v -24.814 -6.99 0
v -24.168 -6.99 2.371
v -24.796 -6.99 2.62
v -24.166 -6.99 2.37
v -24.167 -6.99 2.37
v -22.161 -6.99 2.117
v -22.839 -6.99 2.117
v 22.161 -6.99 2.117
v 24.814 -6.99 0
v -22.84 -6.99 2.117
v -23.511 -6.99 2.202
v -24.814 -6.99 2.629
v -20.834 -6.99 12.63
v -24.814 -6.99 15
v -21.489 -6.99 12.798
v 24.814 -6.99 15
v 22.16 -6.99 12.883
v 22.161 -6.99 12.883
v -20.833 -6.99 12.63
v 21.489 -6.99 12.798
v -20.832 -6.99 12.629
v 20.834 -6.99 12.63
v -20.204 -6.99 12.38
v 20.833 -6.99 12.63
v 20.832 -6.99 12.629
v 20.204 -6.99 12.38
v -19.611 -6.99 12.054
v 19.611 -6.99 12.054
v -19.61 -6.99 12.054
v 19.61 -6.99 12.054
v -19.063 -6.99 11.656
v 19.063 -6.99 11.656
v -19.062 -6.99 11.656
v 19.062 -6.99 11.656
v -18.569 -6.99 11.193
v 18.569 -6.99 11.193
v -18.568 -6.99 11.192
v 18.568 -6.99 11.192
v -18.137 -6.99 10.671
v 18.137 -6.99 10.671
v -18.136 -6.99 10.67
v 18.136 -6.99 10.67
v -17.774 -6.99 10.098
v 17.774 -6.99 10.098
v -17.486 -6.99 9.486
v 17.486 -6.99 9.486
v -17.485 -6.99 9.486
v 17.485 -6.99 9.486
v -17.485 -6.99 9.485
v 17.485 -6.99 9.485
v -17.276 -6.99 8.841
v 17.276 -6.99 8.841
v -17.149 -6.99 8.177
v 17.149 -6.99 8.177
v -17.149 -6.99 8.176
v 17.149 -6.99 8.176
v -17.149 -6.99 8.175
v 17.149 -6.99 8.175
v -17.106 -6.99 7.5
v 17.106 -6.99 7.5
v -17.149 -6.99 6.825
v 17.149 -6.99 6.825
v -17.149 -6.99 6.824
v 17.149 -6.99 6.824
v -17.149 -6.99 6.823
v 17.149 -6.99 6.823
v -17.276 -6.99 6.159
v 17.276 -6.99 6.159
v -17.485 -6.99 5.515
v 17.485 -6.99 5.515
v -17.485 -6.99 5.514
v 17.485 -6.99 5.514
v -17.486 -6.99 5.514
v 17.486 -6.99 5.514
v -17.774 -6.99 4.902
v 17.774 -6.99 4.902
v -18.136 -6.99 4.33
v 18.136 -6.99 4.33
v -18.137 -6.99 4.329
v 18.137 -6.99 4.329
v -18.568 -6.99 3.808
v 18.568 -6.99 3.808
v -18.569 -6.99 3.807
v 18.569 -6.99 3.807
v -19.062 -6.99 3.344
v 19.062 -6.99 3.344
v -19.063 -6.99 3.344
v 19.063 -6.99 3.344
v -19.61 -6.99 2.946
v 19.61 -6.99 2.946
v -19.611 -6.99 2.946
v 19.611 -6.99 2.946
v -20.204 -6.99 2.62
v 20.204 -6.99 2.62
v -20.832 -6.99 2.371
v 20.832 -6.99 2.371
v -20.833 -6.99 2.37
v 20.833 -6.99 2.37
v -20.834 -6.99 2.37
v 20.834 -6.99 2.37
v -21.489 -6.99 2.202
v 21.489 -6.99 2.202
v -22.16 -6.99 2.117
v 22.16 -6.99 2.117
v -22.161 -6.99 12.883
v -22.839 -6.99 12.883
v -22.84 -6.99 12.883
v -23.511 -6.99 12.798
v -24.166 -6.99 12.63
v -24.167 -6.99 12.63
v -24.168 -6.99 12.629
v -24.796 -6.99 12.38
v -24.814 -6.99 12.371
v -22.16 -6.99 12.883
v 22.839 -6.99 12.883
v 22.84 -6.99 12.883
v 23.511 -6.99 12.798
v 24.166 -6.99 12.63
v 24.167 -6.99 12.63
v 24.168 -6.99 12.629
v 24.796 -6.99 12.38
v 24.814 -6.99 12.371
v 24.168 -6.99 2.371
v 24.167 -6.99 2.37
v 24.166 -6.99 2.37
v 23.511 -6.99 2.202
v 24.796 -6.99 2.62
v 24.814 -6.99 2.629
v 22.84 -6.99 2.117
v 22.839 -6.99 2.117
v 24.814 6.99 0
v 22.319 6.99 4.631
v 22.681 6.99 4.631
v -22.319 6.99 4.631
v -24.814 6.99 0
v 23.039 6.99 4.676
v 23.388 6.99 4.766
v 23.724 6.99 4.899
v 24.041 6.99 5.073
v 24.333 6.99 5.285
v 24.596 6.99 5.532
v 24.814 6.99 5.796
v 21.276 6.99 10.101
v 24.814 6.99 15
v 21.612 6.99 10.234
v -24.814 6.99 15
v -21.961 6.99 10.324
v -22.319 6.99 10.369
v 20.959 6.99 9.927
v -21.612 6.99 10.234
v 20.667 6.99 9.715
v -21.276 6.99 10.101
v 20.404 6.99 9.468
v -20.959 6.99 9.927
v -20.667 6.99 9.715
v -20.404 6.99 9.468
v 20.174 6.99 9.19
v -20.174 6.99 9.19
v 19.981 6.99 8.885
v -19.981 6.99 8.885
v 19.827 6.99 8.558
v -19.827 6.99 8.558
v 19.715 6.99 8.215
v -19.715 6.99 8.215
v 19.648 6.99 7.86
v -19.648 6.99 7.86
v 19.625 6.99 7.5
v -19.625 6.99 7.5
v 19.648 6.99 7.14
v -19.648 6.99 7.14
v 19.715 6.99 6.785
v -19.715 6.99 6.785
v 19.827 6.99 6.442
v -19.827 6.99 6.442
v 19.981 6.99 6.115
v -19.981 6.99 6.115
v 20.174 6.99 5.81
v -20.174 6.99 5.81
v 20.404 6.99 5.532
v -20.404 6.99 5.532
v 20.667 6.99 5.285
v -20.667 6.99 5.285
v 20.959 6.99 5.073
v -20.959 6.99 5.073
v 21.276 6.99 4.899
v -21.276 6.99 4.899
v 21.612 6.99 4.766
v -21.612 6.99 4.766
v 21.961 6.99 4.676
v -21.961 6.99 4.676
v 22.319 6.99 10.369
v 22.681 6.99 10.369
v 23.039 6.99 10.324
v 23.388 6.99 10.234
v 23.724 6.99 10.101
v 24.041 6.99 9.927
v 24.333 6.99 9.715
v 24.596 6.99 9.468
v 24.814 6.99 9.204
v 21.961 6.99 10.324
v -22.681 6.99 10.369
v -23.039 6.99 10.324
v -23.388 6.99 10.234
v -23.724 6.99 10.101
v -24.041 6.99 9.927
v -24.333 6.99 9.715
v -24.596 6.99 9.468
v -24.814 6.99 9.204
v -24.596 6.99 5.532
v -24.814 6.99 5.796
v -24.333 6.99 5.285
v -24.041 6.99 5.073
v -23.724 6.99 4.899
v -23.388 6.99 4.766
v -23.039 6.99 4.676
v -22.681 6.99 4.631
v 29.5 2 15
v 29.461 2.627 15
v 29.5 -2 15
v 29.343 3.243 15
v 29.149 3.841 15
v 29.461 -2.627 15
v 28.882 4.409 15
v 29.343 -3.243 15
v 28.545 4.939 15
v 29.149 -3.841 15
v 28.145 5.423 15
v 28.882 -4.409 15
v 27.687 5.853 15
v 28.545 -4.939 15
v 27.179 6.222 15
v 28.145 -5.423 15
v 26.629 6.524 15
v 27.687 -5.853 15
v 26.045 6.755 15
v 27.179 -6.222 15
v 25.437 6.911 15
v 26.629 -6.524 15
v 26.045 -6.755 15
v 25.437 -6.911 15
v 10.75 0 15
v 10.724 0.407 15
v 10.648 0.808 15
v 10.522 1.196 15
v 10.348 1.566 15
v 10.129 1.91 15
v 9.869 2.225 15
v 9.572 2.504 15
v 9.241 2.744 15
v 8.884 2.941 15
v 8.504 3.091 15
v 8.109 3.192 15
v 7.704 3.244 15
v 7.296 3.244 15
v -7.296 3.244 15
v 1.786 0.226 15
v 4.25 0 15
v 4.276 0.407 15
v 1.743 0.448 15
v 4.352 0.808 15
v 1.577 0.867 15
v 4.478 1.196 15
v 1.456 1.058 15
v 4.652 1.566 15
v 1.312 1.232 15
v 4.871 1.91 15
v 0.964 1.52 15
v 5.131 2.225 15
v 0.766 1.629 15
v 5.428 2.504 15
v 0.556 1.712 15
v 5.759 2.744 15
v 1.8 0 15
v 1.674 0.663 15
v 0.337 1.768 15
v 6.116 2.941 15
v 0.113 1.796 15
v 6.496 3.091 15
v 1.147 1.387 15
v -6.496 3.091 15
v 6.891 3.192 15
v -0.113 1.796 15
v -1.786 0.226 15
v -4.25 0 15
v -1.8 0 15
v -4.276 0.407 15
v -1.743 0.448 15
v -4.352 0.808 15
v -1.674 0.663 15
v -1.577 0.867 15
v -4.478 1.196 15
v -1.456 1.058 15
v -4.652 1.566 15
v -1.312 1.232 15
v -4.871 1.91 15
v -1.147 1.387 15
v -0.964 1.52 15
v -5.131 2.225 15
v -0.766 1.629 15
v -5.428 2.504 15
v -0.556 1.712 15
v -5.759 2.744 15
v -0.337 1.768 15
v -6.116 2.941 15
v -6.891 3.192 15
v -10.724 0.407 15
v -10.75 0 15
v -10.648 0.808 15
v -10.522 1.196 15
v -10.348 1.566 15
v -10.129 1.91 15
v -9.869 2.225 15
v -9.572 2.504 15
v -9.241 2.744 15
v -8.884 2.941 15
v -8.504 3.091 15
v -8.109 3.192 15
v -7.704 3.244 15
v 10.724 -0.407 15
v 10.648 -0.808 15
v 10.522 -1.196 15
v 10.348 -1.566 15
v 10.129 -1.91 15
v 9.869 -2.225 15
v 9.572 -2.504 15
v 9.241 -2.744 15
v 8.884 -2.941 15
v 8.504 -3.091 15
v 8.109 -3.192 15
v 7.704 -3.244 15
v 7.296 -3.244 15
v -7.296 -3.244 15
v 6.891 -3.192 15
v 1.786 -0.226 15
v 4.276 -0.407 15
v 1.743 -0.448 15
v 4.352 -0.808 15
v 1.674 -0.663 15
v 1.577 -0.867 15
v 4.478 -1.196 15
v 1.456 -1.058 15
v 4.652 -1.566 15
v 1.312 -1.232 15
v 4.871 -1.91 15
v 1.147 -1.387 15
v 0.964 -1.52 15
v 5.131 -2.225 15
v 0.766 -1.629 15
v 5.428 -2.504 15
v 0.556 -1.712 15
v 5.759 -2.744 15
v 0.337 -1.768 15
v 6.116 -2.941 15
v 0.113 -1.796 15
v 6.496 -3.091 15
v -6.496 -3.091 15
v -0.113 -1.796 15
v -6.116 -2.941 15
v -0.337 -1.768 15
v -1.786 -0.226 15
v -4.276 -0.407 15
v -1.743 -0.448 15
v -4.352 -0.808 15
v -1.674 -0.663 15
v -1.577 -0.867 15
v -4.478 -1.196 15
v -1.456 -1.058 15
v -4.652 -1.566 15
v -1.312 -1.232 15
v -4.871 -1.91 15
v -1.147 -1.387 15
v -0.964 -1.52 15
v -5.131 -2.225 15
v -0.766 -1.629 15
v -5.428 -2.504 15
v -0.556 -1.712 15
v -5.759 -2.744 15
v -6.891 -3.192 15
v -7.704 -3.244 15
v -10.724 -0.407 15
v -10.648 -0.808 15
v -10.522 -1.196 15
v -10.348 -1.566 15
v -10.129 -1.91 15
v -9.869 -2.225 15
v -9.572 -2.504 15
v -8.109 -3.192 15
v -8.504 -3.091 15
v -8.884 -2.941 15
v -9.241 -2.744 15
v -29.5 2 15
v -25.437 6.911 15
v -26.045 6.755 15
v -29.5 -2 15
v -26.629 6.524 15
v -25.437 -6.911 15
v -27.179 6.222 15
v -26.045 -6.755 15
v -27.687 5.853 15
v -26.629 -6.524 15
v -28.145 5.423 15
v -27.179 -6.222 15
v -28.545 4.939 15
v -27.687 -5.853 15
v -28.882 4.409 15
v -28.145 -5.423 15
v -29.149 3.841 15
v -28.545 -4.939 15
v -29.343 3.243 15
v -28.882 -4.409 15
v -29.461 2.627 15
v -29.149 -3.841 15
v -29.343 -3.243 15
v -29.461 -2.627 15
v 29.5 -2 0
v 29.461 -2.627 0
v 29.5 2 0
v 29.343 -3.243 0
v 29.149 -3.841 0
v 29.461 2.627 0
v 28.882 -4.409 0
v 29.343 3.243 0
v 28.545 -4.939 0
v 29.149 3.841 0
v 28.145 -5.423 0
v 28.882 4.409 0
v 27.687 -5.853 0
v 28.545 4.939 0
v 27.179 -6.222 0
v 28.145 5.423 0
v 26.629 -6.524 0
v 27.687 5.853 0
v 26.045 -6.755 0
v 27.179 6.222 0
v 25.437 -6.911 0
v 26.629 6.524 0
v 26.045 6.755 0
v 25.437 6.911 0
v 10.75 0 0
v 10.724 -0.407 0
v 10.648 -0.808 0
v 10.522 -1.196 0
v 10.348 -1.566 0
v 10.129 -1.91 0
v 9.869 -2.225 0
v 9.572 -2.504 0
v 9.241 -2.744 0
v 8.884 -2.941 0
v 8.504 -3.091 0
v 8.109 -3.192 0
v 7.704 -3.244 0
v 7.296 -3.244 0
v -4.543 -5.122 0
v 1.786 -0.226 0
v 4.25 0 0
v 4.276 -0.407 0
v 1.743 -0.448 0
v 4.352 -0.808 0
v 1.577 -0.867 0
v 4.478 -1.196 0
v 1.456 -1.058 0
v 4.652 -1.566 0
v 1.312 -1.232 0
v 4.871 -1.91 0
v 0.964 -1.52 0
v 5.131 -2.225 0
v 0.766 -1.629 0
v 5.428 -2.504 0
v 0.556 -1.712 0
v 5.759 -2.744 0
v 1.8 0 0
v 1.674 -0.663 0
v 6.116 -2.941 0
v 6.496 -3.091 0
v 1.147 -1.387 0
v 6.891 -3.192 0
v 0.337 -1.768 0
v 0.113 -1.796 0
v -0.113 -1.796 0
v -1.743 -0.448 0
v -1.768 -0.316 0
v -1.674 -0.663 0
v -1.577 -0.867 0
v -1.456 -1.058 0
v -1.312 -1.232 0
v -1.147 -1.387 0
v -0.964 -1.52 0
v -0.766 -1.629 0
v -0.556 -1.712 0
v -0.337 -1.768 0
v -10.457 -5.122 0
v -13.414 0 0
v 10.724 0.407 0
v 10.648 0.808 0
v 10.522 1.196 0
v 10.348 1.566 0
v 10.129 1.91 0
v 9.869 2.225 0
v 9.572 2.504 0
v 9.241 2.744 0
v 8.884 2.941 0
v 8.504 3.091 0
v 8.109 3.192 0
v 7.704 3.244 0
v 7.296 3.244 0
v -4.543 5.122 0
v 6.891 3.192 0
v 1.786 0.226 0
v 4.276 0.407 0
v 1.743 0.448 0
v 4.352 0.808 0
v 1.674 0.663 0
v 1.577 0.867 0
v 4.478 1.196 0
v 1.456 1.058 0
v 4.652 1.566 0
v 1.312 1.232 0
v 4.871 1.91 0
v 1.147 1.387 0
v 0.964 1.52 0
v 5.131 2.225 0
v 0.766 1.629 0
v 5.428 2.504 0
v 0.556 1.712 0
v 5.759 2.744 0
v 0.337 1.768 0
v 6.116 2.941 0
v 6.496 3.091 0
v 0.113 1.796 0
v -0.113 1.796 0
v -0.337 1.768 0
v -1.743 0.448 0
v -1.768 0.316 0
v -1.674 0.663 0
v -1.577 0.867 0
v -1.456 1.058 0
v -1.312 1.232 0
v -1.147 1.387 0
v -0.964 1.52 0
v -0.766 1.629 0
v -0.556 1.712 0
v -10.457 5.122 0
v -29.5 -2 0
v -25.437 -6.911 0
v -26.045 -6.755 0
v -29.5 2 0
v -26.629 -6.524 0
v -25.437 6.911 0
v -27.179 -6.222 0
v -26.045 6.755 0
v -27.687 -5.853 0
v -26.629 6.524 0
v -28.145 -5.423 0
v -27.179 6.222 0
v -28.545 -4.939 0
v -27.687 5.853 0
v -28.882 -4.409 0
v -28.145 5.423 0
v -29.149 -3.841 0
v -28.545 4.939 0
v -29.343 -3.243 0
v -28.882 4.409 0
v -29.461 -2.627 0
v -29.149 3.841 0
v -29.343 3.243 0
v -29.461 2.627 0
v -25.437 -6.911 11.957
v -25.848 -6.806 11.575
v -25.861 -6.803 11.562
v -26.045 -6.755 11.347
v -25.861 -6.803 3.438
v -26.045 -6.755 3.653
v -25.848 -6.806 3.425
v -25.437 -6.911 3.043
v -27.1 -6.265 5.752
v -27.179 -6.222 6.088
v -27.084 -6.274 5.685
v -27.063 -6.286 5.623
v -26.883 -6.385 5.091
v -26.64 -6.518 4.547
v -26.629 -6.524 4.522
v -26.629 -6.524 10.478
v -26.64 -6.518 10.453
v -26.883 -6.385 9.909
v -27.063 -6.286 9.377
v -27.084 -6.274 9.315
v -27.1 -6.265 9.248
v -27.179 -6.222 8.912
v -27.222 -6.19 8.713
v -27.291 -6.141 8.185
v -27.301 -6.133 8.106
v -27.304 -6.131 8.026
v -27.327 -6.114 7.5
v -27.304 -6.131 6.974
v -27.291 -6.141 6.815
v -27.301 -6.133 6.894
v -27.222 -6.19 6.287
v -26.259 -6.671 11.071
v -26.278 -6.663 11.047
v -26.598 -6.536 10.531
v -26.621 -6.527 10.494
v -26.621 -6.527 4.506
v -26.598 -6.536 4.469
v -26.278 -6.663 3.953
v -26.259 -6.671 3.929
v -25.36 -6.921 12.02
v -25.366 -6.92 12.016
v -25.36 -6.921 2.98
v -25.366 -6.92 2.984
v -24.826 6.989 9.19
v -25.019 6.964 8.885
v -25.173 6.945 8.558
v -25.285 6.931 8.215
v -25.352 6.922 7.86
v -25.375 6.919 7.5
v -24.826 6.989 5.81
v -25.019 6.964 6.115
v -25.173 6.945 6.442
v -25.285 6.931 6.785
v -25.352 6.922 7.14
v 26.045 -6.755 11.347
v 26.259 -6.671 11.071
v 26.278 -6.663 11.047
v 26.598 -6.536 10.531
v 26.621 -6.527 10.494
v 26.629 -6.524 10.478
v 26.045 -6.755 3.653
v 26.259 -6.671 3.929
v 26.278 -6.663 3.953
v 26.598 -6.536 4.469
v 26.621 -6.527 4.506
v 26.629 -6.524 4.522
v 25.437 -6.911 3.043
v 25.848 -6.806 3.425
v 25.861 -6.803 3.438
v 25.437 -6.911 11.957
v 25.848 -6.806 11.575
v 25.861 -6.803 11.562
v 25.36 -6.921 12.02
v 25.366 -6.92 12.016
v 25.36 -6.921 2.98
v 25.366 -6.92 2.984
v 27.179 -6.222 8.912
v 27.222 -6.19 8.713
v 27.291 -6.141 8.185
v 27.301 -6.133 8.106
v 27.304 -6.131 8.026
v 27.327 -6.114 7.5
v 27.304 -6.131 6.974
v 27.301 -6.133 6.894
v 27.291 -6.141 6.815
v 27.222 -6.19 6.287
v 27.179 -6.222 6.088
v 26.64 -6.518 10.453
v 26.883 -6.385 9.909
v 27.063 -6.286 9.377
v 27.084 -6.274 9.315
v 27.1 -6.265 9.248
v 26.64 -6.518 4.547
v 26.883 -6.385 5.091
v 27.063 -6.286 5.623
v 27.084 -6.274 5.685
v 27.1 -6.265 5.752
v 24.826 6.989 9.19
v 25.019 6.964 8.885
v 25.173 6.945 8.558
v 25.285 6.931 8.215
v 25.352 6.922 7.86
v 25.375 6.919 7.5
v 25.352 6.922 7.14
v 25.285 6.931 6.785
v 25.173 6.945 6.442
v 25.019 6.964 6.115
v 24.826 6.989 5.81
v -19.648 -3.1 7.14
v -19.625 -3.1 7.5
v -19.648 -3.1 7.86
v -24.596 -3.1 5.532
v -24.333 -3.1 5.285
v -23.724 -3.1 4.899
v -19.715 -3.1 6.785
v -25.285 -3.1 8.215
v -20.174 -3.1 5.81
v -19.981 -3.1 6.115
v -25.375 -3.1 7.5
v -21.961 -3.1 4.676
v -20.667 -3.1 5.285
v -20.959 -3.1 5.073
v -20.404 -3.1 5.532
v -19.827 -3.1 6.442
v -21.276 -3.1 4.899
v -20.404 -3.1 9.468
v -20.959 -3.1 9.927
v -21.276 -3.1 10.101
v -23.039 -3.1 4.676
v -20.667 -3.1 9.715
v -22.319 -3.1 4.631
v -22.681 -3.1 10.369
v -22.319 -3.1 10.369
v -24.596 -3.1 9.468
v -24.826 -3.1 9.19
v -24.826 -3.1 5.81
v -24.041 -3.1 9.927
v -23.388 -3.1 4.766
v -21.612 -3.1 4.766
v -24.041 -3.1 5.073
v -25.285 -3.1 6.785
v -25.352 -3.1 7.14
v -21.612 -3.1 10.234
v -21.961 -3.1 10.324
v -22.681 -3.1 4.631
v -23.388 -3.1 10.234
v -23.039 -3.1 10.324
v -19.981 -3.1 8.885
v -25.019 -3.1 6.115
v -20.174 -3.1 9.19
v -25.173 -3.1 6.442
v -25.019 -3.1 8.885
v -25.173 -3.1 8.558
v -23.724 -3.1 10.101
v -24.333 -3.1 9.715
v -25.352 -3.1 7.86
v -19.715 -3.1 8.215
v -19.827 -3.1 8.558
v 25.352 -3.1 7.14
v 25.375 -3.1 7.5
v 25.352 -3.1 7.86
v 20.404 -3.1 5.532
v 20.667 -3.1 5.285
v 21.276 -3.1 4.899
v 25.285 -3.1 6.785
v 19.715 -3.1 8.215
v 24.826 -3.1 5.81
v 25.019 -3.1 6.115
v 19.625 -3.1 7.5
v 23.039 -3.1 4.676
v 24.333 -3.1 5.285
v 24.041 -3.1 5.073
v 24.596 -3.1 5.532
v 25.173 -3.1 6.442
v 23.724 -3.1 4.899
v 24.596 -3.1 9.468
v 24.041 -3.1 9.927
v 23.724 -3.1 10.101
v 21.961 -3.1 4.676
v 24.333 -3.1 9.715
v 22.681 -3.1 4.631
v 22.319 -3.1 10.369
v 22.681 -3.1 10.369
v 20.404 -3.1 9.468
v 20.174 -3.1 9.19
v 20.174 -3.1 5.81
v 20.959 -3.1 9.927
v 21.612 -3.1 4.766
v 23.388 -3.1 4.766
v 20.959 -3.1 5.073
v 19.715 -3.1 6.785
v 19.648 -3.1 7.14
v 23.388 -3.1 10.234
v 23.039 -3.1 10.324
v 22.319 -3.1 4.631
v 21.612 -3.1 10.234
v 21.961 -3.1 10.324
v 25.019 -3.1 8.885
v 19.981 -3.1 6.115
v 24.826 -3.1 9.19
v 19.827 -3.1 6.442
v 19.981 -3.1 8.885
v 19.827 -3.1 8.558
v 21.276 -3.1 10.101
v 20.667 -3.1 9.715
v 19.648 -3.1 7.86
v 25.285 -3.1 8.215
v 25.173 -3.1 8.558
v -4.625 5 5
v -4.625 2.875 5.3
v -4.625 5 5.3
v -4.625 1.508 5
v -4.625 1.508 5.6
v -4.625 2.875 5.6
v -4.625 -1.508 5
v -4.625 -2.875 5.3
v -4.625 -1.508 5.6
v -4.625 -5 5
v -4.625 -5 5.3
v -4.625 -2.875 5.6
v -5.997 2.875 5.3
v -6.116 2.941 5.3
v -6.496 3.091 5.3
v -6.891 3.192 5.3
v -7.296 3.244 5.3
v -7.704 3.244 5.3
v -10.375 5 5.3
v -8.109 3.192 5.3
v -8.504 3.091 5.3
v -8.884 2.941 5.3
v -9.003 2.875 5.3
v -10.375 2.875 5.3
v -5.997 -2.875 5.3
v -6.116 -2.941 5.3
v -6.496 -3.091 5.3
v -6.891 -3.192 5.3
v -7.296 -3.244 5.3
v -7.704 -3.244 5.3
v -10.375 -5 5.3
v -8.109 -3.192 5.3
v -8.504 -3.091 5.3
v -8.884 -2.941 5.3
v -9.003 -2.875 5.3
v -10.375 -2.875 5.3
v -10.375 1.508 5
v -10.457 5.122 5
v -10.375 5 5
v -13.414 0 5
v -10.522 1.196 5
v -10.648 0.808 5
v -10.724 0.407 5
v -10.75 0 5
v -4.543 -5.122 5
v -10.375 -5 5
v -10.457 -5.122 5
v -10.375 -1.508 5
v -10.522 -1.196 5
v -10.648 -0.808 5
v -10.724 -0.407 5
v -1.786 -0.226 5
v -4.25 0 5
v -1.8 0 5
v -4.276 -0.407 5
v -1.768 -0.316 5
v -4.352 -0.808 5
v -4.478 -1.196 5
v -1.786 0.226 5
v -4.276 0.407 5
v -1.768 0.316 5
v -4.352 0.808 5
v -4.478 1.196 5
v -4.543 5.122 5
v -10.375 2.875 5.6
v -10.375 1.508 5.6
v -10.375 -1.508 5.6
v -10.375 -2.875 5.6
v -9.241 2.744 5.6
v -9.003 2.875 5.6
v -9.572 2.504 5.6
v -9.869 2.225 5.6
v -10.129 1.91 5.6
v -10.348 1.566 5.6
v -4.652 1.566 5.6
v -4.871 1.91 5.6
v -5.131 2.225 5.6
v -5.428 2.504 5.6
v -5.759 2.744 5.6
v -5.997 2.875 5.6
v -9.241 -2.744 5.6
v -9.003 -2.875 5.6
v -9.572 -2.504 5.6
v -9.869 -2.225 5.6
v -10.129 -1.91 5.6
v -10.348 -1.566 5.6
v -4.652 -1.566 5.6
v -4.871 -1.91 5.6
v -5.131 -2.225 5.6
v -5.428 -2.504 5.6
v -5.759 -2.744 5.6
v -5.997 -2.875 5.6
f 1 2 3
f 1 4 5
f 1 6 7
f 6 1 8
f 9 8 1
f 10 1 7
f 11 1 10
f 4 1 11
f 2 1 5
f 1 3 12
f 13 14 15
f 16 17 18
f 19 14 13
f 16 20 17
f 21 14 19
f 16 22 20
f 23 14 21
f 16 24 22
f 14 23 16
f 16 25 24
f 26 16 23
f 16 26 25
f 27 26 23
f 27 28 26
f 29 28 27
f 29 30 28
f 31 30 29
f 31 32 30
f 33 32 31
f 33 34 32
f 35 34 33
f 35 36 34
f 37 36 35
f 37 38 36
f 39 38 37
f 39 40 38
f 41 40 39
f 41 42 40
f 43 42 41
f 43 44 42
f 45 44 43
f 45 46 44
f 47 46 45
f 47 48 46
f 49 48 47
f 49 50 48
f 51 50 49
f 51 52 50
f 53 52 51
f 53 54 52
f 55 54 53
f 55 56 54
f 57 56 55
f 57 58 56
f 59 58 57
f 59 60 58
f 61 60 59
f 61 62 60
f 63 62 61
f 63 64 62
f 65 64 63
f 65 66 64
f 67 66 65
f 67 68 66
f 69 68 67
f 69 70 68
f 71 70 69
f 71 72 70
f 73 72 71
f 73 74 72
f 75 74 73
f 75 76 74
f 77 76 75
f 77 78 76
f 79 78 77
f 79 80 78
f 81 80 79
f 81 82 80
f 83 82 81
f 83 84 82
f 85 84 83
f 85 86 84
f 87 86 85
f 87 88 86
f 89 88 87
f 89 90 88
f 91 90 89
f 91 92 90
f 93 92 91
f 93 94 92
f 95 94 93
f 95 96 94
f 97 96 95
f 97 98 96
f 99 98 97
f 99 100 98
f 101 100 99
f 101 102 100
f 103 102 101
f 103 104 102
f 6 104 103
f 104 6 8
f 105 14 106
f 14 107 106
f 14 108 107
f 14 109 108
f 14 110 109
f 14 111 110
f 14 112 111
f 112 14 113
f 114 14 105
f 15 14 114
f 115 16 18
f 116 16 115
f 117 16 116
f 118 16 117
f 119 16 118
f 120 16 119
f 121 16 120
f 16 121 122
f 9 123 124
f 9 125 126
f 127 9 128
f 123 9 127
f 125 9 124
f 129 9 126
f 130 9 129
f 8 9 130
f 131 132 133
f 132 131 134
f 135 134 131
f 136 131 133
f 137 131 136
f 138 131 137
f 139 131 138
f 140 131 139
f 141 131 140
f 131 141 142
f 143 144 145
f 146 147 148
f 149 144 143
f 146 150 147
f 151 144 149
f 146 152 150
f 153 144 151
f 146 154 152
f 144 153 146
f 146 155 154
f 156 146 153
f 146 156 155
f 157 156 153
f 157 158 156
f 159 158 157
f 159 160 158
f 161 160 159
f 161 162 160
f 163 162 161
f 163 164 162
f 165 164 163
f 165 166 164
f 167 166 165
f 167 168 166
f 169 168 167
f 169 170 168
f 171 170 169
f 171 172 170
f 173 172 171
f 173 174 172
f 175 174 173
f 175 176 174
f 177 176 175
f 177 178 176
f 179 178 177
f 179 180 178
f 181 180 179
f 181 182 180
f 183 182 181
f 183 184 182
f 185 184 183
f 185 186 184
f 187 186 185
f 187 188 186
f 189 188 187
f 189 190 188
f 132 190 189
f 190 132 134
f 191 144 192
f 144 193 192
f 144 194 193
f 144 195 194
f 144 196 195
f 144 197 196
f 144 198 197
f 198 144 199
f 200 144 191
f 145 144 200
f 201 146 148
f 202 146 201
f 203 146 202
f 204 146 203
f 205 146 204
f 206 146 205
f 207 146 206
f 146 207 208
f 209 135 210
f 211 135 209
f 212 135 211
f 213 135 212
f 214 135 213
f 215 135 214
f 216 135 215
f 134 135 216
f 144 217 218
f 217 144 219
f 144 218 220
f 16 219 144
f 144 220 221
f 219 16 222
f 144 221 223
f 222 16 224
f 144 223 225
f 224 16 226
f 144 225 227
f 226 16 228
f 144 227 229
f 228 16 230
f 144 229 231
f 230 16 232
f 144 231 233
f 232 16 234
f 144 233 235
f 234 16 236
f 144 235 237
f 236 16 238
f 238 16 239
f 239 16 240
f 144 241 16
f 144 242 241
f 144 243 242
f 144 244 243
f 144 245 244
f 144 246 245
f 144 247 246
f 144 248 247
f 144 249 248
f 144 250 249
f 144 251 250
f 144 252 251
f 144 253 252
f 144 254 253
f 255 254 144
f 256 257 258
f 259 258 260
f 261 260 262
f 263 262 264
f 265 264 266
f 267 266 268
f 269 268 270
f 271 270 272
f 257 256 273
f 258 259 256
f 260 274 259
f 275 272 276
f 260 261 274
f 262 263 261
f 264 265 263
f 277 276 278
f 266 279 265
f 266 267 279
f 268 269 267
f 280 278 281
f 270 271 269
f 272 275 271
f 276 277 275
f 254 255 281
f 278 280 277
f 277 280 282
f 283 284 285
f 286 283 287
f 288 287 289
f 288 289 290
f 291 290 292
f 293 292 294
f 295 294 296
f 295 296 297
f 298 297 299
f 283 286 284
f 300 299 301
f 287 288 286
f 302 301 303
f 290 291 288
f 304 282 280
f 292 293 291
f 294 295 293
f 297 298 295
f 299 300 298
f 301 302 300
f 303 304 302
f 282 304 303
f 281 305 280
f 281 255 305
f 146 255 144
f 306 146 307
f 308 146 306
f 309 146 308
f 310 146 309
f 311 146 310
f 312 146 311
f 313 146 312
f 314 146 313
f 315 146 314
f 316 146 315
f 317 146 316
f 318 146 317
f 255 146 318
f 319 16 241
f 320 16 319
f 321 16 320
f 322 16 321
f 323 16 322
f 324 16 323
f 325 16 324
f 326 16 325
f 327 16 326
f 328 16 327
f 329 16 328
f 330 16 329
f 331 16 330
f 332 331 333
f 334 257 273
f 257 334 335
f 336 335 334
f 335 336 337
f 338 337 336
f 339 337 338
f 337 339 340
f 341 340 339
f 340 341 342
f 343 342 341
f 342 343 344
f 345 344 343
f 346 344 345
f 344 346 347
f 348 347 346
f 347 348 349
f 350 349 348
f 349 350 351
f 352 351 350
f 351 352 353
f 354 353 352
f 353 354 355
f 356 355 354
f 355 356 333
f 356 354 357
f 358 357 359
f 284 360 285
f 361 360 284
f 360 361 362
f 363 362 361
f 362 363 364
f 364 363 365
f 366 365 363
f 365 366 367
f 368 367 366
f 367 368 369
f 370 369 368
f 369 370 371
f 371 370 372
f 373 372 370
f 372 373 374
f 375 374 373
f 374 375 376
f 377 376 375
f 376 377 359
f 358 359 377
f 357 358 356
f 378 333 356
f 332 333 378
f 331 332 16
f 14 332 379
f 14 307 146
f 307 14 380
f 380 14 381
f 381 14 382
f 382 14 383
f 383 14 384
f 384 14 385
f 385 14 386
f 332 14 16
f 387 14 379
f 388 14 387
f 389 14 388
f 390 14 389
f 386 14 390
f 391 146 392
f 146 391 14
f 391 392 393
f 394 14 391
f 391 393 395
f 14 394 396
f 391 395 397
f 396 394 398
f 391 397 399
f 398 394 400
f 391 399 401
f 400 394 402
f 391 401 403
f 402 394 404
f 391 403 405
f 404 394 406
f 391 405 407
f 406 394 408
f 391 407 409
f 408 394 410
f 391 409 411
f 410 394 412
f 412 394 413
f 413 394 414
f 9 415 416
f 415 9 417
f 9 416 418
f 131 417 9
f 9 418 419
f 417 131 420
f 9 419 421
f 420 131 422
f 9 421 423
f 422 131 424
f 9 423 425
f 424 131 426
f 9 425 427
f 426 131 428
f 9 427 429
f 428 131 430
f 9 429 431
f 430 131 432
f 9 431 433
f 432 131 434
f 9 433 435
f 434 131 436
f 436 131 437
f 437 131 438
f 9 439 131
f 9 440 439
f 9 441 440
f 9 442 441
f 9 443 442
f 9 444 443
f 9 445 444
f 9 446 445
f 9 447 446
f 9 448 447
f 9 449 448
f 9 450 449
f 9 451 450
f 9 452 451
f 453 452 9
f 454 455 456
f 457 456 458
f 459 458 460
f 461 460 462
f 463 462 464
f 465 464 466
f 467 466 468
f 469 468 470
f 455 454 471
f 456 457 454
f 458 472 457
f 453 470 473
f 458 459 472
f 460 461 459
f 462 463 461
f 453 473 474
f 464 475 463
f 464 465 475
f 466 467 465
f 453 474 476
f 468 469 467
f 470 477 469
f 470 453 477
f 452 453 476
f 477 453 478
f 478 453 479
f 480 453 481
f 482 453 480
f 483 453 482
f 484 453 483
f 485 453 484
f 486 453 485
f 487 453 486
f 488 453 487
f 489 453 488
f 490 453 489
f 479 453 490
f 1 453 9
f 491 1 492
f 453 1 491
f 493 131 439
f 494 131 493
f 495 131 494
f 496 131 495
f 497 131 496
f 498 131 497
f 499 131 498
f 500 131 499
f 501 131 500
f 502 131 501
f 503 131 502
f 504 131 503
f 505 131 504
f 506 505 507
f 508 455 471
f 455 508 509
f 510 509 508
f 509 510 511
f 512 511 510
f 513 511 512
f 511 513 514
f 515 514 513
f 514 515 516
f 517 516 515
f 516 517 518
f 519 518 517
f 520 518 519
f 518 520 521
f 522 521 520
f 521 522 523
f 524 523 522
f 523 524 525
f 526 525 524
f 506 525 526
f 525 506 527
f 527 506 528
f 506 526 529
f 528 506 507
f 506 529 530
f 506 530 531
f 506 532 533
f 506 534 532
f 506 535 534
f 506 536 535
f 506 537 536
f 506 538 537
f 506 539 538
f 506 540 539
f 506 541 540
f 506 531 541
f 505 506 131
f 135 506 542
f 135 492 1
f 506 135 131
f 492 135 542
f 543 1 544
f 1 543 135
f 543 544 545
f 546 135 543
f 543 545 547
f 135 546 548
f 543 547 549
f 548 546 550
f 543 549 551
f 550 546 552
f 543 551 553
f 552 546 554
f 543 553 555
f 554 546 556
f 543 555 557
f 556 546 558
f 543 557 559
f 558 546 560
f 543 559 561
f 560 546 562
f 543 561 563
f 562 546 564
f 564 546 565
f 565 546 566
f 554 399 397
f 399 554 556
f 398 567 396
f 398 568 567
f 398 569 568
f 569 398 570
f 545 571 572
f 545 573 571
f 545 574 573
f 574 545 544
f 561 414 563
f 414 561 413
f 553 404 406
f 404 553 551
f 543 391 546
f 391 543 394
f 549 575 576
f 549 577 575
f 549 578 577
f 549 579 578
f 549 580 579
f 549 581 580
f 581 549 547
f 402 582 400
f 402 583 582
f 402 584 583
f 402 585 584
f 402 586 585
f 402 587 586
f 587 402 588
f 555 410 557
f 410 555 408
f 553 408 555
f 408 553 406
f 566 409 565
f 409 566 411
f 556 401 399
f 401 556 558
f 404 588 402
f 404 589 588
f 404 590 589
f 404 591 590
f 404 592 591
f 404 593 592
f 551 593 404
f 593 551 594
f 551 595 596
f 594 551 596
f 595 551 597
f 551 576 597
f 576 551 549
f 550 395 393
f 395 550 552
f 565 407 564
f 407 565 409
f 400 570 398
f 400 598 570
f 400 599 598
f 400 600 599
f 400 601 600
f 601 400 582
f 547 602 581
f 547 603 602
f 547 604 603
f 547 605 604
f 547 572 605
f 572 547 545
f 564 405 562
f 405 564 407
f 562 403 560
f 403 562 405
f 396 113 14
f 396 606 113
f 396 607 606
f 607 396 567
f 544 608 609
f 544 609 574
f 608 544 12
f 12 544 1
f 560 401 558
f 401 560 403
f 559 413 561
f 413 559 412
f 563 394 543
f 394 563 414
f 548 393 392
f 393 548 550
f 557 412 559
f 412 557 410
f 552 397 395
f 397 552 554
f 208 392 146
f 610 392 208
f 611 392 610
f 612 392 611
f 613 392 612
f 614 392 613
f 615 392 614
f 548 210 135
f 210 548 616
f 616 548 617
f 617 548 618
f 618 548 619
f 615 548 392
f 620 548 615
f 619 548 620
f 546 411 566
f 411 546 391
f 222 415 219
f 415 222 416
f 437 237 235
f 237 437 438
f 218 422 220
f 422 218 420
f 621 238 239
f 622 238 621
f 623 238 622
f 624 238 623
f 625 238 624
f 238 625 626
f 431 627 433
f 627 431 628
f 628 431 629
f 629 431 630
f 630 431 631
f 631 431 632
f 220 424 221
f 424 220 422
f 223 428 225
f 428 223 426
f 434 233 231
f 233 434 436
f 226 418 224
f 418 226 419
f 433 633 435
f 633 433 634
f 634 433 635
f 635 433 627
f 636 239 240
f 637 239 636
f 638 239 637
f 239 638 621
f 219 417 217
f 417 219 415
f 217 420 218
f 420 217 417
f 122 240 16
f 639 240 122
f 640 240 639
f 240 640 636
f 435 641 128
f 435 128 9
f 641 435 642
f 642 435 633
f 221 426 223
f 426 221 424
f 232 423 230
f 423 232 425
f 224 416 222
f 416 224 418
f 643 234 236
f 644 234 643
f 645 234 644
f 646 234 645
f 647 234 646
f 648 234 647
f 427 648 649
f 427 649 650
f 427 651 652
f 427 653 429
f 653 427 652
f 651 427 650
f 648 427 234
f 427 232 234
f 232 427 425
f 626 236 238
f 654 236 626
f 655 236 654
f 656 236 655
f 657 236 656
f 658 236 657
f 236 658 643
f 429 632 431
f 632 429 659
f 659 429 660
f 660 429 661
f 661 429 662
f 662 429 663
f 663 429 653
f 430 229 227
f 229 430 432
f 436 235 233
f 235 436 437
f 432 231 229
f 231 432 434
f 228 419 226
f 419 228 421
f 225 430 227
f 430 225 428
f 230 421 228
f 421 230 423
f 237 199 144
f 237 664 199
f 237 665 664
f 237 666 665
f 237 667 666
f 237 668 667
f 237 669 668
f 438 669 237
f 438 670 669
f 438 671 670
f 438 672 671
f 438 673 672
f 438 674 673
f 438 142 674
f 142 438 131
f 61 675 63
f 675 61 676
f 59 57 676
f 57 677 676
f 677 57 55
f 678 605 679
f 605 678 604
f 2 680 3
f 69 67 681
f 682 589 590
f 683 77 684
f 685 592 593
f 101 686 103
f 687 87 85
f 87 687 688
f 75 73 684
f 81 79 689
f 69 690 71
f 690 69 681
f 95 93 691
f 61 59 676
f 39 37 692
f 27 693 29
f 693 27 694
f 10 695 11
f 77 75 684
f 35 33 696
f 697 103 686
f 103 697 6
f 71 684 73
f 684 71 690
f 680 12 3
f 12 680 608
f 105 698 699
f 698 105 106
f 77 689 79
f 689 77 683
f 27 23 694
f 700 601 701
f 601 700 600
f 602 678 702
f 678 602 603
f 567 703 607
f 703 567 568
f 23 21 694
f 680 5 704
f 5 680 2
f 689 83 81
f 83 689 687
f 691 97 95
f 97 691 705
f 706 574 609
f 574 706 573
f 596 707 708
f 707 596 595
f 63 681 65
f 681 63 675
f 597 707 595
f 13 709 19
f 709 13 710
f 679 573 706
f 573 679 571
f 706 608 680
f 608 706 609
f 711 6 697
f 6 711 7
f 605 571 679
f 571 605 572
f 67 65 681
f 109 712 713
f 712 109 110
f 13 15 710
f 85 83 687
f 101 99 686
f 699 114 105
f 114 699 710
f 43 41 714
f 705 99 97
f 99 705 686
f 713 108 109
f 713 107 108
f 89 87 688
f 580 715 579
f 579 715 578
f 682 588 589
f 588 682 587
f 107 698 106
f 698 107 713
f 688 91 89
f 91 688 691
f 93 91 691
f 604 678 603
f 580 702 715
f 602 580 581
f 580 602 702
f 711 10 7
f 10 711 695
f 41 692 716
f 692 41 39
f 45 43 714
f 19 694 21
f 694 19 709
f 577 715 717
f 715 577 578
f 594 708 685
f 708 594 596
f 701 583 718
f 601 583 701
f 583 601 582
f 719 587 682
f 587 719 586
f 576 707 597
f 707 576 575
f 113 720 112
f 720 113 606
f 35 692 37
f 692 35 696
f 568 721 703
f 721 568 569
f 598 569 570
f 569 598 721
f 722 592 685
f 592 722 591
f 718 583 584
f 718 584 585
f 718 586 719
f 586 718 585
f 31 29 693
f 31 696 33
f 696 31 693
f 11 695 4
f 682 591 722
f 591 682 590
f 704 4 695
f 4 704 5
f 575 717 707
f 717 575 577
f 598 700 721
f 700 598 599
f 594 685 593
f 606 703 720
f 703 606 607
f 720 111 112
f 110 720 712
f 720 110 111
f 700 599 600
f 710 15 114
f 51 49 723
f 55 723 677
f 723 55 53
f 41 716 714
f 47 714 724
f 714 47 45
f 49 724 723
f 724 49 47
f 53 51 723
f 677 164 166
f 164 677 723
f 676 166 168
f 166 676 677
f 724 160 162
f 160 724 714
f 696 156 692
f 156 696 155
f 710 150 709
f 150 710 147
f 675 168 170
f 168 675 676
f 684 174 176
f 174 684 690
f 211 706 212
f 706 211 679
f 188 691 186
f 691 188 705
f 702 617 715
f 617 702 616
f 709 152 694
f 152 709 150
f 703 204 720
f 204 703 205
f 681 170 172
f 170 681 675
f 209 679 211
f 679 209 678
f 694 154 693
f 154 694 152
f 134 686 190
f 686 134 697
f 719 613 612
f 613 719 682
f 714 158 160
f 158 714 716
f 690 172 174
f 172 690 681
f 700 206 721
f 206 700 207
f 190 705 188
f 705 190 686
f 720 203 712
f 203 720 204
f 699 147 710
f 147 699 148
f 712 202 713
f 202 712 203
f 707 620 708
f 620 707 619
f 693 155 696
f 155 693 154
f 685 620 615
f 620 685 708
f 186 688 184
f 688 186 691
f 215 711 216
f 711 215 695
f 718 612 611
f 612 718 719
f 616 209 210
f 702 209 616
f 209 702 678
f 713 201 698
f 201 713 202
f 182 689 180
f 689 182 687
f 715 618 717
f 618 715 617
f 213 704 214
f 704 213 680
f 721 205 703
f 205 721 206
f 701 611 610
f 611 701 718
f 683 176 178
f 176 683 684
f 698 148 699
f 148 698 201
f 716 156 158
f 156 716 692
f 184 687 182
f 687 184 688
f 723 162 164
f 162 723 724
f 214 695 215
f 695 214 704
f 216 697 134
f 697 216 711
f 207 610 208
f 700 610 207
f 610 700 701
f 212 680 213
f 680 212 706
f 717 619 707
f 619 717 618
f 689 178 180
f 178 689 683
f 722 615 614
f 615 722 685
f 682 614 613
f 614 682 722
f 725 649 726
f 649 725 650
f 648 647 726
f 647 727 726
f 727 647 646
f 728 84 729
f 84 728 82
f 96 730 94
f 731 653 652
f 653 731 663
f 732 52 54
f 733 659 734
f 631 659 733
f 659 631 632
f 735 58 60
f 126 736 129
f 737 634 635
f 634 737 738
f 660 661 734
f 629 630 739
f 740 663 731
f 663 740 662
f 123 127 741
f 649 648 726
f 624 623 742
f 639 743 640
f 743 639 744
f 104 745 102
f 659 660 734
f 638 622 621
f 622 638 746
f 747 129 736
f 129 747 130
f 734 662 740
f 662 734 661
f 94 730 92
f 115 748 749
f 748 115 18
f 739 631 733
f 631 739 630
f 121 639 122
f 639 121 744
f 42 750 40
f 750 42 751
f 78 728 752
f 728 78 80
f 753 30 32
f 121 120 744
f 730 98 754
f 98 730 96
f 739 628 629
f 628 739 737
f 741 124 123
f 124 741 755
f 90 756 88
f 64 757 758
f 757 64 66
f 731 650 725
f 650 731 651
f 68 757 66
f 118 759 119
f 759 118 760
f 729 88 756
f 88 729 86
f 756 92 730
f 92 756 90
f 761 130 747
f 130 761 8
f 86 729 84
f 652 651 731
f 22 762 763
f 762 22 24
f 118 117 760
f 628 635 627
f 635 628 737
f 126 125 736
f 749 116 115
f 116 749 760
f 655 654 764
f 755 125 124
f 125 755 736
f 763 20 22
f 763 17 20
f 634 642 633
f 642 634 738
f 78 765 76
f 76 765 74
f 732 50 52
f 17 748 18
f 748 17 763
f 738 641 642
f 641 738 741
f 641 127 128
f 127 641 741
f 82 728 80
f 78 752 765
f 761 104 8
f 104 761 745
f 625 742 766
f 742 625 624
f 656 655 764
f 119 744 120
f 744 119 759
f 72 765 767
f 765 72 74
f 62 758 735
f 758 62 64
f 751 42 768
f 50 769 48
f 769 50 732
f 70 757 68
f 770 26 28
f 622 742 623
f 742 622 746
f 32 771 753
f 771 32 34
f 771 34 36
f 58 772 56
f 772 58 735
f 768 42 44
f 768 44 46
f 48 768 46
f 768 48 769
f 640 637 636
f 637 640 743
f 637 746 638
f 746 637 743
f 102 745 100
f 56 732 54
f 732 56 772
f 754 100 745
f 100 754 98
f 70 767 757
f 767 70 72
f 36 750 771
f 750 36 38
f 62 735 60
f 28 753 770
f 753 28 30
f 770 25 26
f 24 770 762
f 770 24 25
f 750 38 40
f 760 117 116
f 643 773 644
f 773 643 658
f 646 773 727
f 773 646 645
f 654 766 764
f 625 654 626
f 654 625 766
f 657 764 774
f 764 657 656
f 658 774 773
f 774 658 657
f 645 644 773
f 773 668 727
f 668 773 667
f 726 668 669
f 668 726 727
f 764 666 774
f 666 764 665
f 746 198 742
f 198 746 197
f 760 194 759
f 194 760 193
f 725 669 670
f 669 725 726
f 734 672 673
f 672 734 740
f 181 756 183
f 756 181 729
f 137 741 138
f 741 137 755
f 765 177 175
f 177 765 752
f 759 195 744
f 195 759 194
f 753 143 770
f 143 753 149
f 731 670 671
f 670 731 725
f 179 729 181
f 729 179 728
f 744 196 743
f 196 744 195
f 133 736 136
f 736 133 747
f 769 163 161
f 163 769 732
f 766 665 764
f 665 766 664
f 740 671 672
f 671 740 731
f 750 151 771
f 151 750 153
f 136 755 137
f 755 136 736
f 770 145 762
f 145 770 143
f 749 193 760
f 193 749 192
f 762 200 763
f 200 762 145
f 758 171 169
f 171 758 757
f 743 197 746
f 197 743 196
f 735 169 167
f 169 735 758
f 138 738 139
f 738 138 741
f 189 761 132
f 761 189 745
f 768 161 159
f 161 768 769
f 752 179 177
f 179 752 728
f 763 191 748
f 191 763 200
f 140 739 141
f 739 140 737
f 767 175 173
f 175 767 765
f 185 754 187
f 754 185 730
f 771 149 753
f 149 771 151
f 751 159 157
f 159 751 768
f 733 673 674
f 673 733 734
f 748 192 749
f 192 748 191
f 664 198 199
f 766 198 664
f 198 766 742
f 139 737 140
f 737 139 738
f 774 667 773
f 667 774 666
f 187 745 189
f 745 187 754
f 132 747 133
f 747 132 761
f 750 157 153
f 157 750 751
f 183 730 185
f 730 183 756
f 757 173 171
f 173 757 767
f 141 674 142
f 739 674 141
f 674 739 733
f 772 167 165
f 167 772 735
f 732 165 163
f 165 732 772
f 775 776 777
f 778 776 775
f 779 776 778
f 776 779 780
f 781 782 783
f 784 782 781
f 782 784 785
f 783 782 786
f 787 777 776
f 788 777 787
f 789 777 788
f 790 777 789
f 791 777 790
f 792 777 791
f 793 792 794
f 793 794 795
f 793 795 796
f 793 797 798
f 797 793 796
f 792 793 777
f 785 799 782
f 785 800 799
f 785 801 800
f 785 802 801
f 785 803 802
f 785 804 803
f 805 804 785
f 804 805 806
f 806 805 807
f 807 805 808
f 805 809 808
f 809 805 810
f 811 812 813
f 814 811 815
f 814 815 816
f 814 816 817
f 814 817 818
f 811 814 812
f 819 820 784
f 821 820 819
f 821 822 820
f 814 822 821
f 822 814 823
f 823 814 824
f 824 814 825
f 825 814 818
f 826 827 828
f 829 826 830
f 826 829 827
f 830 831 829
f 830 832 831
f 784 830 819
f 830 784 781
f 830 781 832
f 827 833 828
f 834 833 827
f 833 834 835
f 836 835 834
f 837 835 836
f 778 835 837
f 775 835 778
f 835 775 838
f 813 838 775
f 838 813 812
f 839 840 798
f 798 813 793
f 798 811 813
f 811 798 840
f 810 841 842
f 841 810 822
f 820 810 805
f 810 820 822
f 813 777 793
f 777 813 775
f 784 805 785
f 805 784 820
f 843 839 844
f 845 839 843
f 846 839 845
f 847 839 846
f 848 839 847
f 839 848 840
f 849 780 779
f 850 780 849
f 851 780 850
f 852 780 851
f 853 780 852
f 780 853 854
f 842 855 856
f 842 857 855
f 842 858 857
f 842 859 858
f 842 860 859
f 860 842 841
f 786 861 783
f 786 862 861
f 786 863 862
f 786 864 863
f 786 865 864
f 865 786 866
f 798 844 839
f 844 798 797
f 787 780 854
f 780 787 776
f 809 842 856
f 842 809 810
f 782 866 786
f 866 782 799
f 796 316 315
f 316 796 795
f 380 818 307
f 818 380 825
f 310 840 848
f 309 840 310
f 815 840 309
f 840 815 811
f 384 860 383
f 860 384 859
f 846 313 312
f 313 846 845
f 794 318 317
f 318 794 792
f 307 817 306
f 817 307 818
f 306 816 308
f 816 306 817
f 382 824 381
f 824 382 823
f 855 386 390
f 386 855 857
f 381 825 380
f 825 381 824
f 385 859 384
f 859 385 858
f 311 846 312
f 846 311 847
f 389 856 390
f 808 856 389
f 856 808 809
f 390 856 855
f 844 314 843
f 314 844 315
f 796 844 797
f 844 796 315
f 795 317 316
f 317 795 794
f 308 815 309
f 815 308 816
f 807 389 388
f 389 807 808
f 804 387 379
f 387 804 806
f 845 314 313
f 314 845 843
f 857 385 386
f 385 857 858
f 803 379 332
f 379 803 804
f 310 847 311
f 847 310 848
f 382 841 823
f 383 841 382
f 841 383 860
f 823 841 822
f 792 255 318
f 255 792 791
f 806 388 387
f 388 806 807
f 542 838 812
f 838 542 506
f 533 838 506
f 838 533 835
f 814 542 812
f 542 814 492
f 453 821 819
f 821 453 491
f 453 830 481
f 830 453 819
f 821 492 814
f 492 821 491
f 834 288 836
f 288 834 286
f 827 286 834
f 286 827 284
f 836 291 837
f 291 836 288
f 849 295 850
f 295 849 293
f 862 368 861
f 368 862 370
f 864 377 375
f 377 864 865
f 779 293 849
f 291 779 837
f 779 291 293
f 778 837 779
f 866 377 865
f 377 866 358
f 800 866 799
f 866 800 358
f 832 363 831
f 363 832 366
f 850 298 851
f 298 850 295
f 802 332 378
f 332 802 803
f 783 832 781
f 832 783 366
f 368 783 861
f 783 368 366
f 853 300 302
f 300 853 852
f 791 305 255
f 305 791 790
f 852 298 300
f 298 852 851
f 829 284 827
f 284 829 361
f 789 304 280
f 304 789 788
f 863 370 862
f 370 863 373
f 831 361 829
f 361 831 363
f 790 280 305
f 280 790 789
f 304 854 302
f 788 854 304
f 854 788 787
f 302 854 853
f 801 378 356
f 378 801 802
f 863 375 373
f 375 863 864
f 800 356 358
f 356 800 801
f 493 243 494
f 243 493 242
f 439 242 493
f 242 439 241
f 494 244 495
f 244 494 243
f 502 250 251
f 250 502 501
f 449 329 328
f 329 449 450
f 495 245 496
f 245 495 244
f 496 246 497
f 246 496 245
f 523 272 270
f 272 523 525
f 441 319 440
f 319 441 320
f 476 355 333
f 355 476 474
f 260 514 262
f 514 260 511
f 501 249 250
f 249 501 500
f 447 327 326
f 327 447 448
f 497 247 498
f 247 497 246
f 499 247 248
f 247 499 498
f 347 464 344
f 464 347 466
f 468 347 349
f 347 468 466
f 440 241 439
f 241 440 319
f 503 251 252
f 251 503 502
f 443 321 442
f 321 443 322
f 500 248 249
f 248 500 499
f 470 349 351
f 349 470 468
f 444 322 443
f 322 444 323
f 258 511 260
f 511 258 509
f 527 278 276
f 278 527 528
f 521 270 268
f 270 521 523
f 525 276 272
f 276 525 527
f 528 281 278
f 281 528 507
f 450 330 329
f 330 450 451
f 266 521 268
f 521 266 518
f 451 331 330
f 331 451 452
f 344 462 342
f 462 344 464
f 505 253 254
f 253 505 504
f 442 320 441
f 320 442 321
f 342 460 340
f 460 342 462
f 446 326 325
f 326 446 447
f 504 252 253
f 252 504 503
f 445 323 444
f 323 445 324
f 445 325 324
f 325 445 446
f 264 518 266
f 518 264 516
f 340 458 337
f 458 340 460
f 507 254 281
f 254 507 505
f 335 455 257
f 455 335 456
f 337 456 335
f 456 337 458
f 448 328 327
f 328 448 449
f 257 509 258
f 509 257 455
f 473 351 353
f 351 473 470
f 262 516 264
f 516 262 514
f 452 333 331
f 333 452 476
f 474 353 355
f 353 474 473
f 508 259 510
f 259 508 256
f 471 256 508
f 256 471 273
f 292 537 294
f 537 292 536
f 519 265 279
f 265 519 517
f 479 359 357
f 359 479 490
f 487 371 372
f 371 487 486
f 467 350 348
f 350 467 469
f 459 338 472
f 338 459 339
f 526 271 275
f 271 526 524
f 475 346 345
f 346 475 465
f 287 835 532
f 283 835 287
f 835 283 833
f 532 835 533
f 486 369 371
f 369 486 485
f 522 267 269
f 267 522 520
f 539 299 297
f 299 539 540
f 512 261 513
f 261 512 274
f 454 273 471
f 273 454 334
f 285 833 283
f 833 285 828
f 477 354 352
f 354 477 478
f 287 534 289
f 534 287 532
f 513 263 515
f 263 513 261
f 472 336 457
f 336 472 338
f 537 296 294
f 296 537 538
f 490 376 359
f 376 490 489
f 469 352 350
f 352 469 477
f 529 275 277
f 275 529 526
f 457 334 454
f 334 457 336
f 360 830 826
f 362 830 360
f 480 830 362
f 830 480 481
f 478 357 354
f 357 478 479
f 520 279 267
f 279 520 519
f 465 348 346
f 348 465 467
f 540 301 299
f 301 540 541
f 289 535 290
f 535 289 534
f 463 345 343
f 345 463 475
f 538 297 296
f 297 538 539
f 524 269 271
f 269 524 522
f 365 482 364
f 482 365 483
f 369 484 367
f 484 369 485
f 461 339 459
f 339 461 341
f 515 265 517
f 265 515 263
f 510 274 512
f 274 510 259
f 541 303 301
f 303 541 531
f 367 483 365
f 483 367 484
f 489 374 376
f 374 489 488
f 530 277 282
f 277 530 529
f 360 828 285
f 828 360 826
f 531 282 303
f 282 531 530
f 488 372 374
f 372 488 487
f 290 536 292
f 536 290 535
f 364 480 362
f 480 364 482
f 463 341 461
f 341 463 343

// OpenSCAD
$fn = 50;


difference() {
	union() {
		hull() {
			translate(v = [-9.5000000000, 2.0000000000, 0]) {
				cylinder(h = 15, r = 5);
			}
			translate(v = [9.5000000000, 2.0000000000, 0]) {
				cylinder(h = 15, r = 5);
			}
			translate(v = [-9.5000000000, -2.0000000000, 0]) {
				cylinder(h = 15, r = 5);
			}
			translate(v = [9.5000000000, -2.0000000000, 0]) {
				cylinder(h = 15, r = 5);
			}
		}
		translate(v = [-15.0000000000, 0.0000000000, 0]) {
			hull() {
				translate(v = [-9.5000000000, 2.0000000000, 0]) {
					cylinder(h = 15, r = 5);
				}
				translate(v = [9.5000000000, 2.0000000000, 0]) {
					cylinder(h = 15, r = 5);
				}
				translate(v = [-9.5000000000, -2.0000000000, 0]) {
					cylinder(h = 15, r = 5);
				}
				translate(v = [9.5000000000, -2.0000000000, 0]) {
					cylinder(h = 15, r = 5);
				}
			}
		}
		translate(v = [-15.0000000000, 0.0000000000, 0]) {
			hull() {
				translate(v = [-9.5000000000, 2.0000000000, 0]) {
					cylinder(h = 15, r = 5);
				}
				translate(v = [9.5000000000, 2.0000000000, 0]) {
					cylinder(h = 15, r = 5);
				}
				translate(v = [-9.5000000000, -2.0000000000, 0]) {
					cylinder(h = 15, r = 5);
				}
				translate(v = [9.5000000000, -2.0000000000, 0]) {
					cylinder(h = 15, r = 5);
				}
			}
		}
		translate(v = [15.0000000000, 0.0000000000, 0]) {
			hull() {
				translate(v = [-9.5000000000, 2.0000000000, 0]) {
					cylinder(h = 15, r = 5);
				}
				translate(v = [9.5000000000, 2.0000000000, 0]) {
					cylinder(h = 15, r = 5);
				}
				translate(v = [-9.5000000000, -2.0000000000, 0]) {
					cylinder(h = 15, r = 5);
				}
				translate(v = [9.5000000000, -2.0000000000, 0]) {
					cylinder(h = 15, r = 5);
				}
			}
		}
		translate(v = [15.0000000000, 0.0000000000, 0]) {
			hull() {
				translate(v = [-9.5000000000, 2.0000000000, 0]) {
					cylinder(h = 15, r = 5);
				}
				translate(v = [9.5000000000, 2.0000000000, 0]) {
					cylinder(h = 15, r = 5);
				}
				translate(v = [-9.5000000000, -2.0000000000, 0]) {
					cylinder(h = 15, r = 5);
				}
				translate(v = [9.5000000000, -2.0000000000, 0]) {
					cylinder(h = 15, r = 5);
				}
			}
		}
	}
	union() {
		translate(v = [-22.5000000000, -7.0000000000, 7.5000000000]) {
			rotate(a = [90, 0, 0]) {
				difference() {
					union() {
						#translate(v = [0, 0, -14.0000000000]) {
							cylinder(h = 14, r = 2.6000000000);
						}
						#translate(v = [0, 0, -3.9000000000]) {
							cylinder(h = 3.9000000000, r1 = 2.8750000000, r2 = 5.4000000000);
						}
						#translate(v = [0, 0, -14.0000000000]) {
							cylinder(h = 14, r = 2.8750000000);
						}
						#translate(v = [0, 0, -14.0000000000]) {
							cylinder(h = 14, r = 2.6000000000);
						}
					}
					union();
				}
			}
		}
		translate(v = [22.5000000000, -7.0000000000, 7.5000000000]) {
			rotate(a = [90, 0, 0]) {
				difference() {
					union() {
						#translate(v = [0, 0, -14.0000000000]) {
							cylinder(h = 14, r = 2.6000000000);
						}
						#translate(v = [0, 0, -3.9000000000]) {
							cylinder(h = 3.9000000000, r1 = 2.8750000000, r2 = 5.4000000000);
						}
						#translate(v = [0, 0, -14.0000000000]) {
							cylinder(h = 14, r = 2.8750000000);
						}
						#translate(v = [0, 0, -14.0000000000]) {
							cylinder(h = 14, r = 2.6000000000);
						}
					}
					union();
				}
			}
		}
		translate(v = [-7.5000000000, 0.0000000000, 0]) {
			rotate(a = [0, 0, 0]) {
				difference() {
					union() {
						#translate(v = [-2.8750000000, -5.0000000000, -0.3000000000]) {
							cube(size = [5.7500000000, 10, 0.3000000000]);
						}
						#translate(v = [-2.8750000000, -2.8750000000, -0.6000000000]) {
							cube(size = [5.7500000000, 5.7500000000, 0.3000000000]);
						}
						#translate(v = [-2.8750000000, -5.0000000000, 5]) {
							cube(size = [5.7500000000, 10, 0.3000000000]);
						}
						#translate(v = [-2.8750000000, -2.8750000000, 5.3000000000]) {
							cube(size = [5.7500000000, 5.7500000000, 0.3000000000]);
						}
						#translate(v = [0, 0, -100.0000000000]) {
							cylinder(h = 200, r = 3.2500000000);
						}
						#linear_extrude(height = 5) {
							polygon(points = [[5.9142500000, 0.0000000000], [2.9571250000, 5.1218907443], [-2.9571250000, 5.1218907443], [-5.9142500000, 0.0000000000], [-2.9571250000, -5.1218907443], [2.9571250000, -5.1218907443]]);
						}
						#translate(v = [-2.8750000000, -5.0000000000, -0.3000000000]) {
							cube(size = [5.7500000000, 10, 0.3000000000]);
						}
						#translate(v = [-2.8750000000, -2.8750000000, -0.6000000000]) {
							cube(size = [5.7500000000, 5.7500000000, 0.3000000000]);
						}
						#translate(v = [-2.8750000000, -5.0000000000, 5]) {
							cube(size = [5.7500000000, 10, 0.3000000000]);
						}
						#translate(v = [-2.8750000000, -2.8750000000, 5.3000000000]) {
							cube(size = [5.7500000000, 5.7500000000, 0.3000000000]);
						}
						#translate(v = [0, 0, -100.0000000000]) {
							cylinder(h = 200, r = 3.2500000000);
						}
						#translate(v = [-2.8750000000, -5.0000000000, -0.3000000000]) {
							cube(size = [5.7500000000, 10, 0.3000000000]);
						}
						#translate(v = [-2.8750000000, -2.8750000000, -0.6000000000]) {
							cube(size = [5.7500000000, 5.7500000000, 0.3000000000]);
						}
						#translate(v = [-2.8750000000, -5.0000000000, 5]) {
							cube(size = [5.7500000000, 10, 0.3000000000]);
						}
						#translate(v = [-2.8750000000, -2.8750000000, 5.3000000000]) {
							cube(size = [5.7500000000, 5.7500000000, 0.3000000000]);
						}
						#translate(v = [0, 0, -100.0000000000]) {
							cylinder(h = 200, r = 3.2500000000);
						}
					}
					union();
				}
			}
		}
		translate(v = [-7.5000000000, 0.0000000000, 0]) {
			translate(v = [0, 0, -100]) {
				cylinder(h = 200, r = 3.2500000000);
			}
		}
		translate(v = [7.5000000000, 0.0000000000, 0]) {
			translate(v = [0, 0, -100]) {
				cylinder(h = 200, r = 3.2500000000);
			}
		}
		translate(v = [-7.5000000000, 0.0000000000, 0]) {
			translate(v = [0, 0, -100]) {
				cylinder(h = 200, r = 1.8000000000);
			}
		}
		translate(v = [0, 0, -100]) {
			cylinder(h = 200, r = 1.8000000000);
		}
		translate(v = [7.5000000000, 0.0000000000, 0]) {
			translate(v = [0, 0, -100]) {
				cylinder(h = 200, r = 1.8000000000);
			}
		}
	}
}
